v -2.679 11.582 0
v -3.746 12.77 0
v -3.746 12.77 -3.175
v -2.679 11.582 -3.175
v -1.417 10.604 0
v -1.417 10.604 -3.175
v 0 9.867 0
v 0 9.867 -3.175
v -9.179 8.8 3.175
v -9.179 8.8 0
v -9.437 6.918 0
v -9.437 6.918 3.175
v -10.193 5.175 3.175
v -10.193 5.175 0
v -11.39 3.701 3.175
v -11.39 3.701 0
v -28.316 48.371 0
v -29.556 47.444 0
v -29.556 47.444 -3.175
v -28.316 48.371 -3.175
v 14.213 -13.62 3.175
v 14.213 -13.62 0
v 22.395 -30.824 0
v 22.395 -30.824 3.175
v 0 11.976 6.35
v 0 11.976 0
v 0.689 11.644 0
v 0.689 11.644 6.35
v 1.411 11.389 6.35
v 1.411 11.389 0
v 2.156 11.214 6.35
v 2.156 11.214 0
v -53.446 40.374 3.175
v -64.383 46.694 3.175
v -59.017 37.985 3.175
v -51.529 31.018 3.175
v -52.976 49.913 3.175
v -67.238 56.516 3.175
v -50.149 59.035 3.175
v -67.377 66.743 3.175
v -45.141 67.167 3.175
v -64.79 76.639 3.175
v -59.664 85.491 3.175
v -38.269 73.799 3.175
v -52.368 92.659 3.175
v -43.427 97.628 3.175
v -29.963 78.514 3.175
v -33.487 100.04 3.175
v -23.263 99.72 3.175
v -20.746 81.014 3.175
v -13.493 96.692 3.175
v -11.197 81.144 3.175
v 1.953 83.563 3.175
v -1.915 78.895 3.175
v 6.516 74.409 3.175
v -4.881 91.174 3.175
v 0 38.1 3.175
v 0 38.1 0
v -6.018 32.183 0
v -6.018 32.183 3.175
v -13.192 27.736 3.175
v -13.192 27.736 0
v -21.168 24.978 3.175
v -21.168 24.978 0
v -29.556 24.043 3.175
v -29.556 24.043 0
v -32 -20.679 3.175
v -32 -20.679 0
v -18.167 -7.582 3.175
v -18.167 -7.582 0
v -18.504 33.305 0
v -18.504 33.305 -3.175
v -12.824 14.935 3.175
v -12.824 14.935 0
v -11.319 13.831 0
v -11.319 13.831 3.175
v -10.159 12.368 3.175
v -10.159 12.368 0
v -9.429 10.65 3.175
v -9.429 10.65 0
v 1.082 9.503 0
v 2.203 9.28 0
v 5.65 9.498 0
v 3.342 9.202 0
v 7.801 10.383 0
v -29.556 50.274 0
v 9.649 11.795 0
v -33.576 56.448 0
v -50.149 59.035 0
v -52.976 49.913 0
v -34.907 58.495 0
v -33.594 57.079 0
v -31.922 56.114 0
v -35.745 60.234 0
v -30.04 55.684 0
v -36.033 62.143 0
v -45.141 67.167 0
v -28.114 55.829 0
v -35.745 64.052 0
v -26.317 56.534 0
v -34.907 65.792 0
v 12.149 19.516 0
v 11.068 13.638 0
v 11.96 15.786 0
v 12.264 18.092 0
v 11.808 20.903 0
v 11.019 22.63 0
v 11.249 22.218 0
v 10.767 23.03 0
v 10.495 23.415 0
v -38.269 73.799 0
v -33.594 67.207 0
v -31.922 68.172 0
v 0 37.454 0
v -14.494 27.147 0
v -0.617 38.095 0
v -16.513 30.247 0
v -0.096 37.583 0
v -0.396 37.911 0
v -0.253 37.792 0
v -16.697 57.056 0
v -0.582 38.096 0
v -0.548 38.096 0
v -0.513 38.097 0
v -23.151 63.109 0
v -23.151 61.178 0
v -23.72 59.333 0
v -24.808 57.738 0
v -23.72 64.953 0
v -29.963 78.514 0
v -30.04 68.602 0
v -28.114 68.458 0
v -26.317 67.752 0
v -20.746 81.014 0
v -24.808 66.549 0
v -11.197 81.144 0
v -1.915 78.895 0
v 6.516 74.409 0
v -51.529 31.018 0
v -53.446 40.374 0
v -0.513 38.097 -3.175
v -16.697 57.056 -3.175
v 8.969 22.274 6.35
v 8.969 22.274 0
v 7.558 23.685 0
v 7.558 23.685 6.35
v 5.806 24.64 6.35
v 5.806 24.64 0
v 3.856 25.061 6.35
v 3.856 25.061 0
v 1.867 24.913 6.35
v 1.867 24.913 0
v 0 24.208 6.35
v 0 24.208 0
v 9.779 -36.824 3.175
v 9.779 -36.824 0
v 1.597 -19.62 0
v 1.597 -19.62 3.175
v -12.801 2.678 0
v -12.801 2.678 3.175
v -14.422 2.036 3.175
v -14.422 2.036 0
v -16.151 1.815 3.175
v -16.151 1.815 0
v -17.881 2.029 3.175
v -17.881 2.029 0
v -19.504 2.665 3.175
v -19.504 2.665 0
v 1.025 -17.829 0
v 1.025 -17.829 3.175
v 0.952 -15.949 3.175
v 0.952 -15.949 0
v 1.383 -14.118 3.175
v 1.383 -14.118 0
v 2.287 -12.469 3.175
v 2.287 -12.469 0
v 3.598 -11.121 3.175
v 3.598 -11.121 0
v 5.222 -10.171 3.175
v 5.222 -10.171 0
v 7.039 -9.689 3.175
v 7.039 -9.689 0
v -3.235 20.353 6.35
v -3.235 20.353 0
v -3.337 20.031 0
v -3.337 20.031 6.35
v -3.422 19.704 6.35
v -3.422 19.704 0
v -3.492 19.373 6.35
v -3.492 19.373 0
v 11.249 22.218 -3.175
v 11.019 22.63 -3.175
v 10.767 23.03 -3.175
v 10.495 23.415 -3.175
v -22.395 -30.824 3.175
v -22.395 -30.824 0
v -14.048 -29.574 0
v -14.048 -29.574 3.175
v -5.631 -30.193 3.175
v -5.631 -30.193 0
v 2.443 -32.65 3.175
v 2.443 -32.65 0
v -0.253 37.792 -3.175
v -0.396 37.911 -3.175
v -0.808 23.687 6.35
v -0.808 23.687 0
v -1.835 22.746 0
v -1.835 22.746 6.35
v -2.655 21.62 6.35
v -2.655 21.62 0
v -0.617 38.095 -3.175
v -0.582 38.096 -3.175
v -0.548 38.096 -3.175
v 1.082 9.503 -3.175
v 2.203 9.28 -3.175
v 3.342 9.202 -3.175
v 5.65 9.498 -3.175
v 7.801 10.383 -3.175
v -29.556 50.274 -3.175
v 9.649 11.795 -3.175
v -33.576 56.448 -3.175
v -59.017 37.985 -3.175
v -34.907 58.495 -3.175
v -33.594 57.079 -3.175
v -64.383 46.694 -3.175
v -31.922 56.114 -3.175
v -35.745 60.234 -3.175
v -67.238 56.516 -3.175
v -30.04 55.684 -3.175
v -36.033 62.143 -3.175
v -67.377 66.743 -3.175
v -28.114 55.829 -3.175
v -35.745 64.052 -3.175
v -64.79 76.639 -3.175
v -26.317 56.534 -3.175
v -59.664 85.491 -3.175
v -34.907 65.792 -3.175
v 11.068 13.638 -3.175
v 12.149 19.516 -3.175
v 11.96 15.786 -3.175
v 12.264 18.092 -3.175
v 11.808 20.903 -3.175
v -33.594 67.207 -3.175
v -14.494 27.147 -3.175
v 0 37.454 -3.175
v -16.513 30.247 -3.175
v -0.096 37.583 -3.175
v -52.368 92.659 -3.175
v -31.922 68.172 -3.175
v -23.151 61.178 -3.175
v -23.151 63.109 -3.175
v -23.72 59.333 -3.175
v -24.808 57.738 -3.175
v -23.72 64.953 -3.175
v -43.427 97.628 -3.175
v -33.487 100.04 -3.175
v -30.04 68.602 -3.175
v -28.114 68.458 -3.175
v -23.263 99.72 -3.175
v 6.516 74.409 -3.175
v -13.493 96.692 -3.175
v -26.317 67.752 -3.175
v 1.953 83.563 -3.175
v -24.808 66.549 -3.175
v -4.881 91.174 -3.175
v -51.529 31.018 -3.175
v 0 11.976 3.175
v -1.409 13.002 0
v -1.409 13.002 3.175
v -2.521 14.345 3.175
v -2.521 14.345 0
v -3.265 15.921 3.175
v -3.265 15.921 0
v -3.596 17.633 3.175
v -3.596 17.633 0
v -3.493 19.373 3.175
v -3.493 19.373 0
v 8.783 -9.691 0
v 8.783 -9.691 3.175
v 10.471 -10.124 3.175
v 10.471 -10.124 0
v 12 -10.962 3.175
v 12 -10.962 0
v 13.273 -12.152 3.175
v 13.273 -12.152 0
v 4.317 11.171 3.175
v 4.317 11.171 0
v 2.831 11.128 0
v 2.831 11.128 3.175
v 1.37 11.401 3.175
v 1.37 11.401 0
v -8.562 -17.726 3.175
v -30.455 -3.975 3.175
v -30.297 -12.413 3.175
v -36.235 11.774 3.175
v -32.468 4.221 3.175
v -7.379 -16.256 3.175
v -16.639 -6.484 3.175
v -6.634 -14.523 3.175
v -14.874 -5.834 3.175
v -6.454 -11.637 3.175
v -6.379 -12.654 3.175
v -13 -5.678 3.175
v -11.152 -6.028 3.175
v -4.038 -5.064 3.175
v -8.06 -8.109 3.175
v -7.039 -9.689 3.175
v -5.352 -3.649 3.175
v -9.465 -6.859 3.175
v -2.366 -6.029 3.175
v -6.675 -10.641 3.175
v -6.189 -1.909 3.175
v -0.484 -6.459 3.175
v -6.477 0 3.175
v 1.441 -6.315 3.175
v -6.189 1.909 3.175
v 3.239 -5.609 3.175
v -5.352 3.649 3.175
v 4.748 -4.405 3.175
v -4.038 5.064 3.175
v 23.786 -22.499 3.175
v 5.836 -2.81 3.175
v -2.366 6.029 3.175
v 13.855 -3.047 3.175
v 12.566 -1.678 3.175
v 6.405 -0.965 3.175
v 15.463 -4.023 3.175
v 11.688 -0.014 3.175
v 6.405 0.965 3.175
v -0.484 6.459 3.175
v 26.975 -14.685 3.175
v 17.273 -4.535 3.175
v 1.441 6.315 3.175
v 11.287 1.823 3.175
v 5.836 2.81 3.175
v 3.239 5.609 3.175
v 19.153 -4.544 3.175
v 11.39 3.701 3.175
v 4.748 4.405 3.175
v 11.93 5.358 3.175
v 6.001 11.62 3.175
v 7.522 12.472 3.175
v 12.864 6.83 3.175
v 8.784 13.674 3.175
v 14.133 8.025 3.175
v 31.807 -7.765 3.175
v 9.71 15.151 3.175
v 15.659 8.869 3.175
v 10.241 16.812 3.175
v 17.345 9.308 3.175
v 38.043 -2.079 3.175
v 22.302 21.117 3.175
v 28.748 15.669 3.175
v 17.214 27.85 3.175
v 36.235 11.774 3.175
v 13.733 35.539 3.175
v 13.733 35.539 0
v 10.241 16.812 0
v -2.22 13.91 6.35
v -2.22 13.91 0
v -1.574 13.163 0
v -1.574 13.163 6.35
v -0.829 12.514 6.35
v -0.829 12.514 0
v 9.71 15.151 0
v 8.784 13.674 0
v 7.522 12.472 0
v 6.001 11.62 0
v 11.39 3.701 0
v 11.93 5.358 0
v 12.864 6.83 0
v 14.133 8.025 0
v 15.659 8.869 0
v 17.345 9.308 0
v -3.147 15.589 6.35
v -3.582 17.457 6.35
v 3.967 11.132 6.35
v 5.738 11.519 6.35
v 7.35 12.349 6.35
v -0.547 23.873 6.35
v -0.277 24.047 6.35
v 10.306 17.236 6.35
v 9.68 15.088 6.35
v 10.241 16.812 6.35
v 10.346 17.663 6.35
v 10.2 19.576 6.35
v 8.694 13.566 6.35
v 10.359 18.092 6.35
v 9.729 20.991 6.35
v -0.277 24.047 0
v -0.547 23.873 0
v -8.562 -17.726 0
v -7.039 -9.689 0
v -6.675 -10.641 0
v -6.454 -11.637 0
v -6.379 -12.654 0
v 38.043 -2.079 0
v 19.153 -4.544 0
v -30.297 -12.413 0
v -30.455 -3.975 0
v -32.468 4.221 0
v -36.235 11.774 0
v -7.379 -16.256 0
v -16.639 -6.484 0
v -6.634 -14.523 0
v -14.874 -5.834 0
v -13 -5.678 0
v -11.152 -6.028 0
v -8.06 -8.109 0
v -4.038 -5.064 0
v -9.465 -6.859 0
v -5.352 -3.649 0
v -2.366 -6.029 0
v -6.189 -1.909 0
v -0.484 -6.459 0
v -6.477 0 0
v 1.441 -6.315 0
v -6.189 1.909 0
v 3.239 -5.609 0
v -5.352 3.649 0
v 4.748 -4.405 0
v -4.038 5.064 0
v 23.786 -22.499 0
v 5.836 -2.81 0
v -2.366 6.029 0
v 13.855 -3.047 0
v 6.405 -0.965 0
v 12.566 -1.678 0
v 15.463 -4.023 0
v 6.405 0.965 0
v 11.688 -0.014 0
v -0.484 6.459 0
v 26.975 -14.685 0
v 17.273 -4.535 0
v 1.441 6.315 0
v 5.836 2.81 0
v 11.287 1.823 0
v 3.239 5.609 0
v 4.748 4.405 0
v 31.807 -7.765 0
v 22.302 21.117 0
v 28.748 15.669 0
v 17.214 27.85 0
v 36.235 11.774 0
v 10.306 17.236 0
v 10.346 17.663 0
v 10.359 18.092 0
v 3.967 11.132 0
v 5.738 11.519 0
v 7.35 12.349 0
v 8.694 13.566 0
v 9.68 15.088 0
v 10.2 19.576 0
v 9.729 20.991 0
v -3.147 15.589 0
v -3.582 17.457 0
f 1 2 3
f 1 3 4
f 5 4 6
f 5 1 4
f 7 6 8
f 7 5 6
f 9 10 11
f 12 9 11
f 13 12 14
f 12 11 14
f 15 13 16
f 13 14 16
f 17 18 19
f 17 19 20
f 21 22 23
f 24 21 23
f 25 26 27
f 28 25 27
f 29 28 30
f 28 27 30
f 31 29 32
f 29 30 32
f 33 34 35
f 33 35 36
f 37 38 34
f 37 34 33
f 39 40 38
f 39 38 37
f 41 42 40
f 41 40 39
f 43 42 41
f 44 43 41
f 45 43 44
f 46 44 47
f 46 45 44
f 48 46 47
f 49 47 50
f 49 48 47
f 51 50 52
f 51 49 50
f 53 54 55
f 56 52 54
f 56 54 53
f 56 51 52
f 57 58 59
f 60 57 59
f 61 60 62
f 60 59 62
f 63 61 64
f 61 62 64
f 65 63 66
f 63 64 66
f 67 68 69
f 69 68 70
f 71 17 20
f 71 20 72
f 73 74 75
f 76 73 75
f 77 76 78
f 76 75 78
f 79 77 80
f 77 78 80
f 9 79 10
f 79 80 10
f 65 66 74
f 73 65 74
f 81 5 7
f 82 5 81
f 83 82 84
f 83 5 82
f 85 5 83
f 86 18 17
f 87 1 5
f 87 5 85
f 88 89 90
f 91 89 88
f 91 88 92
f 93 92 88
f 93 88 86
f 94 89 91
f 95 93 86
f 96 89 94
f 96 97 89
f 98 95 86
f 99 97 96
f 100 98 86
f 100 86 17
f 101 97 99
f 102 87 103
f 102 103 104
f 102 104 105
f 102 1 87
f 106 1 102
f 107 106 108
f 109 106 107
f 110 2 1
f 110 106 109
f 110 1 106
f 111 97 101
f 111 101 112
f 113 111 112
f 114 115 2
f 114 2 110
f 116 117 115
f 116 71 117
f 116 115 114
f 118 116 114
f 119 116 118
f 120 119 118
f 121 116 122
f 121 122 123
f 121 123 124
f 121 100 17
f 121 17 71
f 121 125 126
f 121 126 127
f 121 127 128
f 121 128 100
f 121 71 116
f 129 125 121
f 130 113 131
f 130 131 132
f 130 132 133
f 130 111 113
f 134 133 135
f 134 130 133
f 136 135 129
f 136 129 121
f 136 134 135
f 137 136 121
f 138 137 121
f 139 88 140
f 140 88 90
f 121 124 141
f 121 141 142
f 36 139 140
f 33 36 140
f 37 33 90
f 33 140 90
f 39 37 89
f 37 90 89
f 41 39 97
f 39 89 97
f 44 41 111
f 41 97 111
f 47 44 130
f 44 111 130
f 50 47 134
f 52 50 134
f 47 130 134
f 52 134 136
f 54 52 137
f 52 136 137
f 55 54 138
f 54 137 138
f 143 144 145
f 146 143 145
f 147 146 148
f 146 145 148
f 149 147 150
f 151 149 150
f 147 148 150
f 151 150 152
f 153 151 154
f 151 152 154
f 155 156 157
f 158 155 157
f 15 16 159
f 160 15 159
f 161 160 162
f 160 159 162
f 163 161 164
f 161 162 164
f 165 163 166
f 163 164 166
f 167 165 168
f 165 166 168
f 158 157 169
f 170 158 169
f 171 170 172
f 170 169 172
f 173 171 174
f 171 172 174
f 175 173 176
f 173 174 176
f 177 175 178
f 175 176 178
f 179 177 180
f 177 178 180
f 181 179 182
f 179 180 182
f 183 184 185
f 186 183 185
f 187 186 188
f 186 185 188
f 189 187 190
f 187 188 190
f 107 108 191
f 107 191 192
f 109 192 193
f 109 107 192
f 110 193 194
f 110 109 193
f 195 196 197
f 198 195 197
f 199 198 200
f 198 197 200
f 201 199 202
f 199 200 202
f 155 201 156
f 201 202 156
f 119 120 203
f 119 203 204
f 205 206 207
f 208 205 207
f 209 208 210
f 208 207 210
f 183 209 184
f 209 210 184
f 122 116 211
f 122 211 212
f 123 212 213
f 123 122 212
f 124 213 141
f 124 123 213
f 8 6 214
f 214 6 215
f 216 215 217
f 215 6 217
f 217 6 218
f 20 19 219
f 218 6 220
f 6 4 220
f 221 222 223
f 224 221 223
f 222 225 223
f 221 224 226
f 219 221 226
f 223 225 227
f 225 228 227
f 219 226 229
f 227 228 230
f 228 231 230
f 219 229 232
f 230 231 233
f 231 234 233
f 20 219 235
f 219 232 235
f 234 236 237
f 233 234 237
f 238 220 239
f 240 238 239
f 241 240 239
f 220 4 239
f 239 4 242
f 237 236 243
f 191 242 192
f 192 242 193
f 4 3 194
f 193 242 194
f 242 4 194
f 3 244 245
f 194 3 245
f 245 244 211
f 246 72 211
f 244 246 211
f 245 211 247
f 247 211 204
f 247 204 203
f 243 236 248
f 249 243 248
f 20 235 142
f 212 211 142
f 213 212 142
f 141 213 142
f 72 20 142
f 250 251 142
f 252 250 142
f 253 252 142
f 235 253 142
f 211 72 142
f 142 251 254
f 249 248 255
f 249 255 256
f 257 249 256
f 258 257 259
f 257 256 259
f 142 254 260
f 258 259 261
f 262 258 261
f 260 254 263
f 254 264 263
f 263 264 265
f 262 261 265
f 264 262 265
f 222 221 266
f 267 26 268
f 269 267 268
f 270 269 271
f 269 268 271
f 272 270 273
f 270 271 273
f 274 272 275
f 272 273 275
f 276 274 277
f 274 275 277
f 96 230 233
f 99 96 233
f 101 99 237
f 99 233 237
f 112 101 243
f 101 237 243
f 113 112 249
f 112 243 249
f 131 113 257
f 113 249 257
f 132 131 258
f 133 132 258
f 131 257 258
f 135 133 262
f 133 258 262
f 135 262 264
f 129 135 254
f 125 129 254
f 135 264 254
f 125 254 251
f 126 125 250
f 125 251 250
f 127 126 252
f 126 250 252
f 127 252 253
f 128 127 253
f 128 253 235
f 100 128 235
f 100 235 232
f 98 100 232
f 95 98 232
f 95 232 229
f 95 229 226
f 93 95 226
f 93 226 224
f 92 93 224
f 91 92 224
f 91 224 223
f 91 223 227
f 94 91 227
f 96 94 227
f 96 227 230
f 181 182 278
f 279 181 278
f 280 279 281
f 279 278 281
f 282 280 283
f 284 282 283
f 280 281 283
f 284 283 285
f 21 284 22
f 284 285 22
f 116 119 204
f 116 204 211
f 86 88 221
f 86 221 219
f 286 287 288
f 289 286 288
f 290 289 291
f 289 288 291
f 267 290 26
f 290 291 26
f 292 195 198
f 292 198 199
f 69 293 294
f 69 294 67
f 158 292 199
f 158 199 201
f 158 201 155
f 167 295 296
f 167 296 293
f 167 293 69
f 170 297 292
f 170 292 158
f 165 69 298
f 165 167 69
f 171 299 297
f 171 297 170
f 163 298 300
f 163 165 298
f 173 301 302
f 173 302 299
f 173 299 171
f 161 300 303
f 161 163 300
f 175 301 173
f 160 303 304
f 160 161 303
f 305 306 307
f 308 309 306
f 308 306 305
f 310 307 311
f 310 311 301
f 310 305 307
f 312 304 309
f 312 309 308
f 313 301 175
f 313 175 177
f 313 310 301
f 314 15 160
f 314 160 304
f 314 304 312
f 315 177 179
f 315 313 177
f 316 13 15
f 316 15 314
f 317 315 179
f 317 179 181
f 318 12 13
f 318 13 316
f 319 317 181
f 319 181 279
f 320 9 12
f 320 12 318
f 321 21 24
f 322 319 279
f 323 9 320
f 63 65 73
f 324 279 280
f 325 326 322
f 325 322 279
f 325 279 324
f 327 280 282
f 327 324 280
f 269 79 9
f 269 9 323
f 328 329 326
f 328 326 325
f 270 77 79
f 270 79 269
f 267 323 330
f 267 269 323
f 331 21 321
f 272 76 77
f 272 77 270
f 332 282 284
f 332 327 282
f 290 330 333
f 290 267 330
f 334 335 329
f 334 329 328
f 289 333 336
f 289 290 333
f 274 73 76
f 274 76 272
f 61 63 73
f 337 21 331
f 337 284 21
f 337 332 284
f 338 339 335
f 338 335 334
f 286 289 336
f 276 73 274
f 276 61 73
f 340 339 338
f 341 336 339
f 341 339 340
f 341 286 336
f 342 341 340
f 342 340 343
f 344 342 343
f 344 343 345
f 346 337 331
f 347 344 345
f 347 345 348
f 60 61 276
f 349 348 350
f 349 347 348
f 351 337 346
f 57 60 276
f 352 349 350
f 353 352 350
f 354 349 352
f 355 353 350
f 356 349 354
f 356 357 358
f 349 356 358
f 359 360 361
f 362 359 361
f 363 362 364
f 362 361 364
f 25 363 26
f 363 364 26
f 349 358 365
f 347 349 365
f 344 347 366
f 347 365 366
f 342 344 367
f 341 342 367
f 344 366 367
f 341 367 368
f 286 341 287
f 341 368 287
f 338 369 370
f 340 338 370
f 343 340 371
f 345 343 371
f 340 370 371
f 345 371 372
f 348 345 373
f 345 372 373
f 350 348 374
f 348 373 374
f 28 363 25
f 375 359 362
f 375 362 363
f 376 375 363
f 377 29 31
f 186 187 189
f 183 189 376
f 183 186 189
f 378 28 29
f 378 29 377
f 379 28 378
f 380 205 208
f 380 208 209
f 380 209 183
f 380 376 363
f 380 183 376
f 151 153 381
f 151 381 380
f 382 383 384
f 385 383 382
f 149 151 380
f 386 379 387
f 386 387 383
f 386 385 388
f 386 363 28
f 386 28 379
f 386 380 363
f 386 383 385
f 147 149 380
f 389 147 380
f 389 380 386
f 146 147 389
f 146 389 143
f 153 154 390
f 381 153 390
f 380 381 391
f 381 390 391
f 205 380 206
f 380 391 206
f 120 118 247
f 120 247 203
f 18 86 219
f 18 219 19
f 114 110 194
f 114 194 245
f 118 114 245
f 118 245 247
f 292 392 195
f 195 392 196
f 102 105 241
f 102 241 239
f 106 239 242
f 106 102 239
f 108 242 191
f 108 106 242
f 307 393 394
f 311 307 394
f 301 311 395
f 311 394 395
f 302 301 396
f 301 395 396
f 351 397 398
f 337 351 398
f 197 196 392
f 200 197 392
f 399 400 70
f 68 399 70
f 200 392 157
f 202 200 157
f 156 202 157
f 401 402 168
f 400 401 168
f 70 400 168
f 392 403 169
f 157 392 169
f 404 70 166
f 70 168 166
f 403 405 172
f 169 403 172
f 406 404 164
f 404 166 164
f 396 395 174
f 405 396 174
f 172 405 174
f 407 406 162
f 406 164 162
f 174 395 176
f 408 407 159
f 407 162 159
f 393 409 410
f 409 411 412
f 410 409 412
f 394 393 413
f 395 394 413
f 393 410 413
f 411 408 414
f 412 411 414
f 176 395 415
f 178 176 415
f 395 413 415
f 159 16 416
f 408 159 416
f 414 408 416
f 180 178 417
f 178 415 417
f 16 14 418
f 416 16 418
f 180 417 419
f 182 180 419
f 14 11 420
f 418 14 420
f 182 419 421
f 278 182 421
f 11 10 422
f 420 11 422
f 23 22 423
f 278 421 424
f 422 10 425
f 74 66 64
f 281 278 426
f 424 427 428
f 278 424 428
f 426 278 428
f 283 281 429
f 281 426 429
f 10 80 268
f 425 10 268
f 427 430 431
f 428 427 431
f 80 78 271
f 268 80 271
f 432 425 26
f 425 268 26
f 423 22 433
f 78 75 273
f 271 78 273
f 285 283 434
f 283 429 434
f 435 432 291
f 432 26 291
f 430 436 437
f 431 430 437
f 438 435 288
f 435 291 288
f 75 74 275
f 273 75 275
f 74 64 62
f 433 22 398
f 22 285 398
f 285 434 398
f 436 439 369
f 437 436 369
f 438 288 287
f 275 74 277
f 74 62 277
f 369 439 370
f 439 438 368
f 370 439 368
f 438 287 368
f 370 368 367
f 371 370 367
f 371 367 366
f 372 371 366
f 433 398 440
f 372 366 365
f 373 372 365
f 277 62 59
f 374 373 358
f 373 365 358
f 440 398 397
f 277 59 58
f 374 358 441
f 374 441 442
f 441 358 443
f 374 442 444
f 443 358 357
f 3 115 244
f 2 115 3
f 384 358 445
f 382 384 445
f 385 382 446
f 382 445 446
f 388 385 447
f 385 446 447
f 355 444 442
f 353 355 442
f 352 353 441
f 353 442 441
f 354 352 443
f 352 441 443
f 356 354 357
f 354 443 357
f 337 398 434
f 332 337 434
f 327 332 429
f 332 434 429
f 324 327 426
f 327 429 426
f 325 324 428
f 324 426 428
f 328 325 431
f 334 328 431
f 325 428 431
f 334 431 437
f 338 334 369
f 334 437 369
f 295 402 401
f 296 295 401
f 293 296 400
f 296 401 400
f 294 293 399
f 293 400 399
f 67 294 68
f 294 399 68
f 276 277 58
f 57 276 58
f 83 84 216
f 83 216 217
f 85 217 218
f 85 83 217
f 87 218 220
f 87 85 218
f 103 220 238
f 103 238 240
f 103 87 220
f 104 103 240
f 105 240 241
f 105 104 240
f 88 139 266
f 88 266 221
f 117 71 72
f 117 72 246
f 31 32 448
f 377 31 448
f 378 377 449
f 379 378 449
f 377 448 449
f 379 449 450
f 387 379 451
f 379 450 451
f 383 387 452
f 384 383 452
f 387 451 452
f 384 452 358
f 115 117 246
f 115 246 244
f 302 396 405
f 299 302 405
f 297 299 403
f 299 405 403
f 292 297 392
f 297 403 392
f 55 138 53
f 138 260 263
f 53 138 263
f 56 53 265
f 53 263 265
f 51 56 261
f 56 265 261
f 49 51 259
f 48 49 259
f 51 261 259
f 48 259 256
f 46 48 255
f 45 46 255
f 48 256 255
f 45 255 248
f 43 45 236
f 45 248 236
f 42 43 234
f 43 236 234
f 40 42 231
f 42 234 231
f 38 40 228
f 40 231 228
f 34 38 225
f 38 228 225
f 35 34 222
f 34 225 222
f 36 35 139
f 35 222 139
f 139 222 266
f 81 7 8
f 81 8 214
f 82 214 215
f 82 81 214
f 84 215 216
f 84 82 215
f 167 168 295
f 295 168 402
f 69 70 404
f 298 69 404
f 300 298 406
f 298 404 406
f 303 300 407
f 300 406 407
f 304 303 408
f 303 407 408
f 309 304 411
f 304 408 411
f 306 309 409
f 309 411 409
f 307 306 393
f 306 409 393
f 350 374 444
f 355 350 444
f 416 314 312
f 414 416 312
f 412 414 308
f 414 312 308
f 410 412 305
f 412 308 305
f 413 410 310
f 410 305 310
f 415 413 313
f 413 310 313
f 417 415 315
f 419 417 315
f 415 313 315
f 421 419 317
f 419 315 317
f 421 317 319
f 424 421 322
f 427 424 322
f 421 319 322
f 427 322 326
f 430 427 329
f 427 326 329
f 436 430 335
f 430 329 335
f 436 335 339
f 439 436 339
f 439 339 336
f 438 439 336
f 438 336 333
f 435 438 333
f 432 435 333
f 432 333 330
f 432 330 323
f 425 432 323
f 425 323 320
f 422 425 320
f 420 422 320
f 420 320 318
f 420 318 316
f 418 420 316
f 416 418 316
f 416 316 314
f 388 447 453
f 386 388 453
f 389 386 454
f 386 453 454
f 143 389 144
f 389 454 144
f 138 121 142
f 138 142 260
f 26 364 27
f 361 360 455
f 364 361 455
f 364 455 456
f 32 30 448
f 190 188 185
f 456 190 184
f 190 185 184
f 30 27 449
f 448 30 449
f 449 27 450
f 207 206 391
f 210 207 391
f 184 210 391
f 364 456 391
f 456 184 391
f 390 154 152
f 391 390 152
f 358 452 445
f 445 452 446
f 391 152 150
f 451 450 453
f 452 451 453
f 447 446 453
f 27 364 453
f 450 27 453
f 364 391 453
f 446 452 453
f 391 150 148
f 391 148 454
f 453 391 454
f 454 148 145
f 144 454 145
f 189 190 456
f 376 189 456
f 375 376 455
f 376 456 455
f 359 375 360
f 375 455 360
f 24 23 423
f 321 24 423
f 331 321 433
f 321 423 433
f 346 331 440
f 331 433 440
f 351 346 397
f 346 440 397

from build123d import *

# Parameters (mm, degrees)
F1_DEPTH = 3.175
F3_DEPTH = 3.175
F4_DEPTH = 3.175
F5_DEPTH = 6.35
F6_D     = 12.954
F7_D     = 12.954


with BuildPart() as f1:
    # F0 (on Top) → F1 (new body)
    with BuildSketch(Plane.XY):
        with BuildLine():
            Line((-3.4925, 19.3728821291), (0, 38.1))
            ThreePointArc((0, 38.1), (-13.191577027, 27.7363784004), (-29.5556407262, 24.0431716141))
            Line((-29.5556407262, 24.0431716141), (-12.8243350965, 14.9346090532))
            ThreePointArc((-12.8243350965, 14.9346090532), (-10.1591945825, 12.3678271309), (-9.1791413688, 8.799796989))
            ThreePointArc((-9.1791413688, 8.799796989), (-9.7556810347, 6.0209732906), (-11.3901252333, 3.7008760308))
            Line((-11.3901252333, 3.7008760308), (0, 0))
            Line((0, 0), (0, 11.9762864121))
            ThreePointArc((0, 11.9762864121), (-2.9421779805, 15.1098949687), (-3.4925, 19.3728821291))
        make_face()
        with BuildLine():
            Line((-7.0394845303, -9.6890192369), (0, 0))
            Line((0, 0), (-11.3901252333, 3.7008760308))
            ThreePointArc((-11.3901252333, 3.7008760308), (-15.279547067, 1.8710367881), (-19.5039476412, 2.6649849248))
            Line((-19.5039476412, 2.6649849248), (-36.2352532708, 11.7735474857))
            ThreePointArc((-36.2352532708, 11.7735474857), (-30.4552849001, -3.9749230036), (-31.9996103, -20.6793360785))
            Line((-31.9996103, -20.6793360785), (-18.1665947447, -7.5816194589))
            ThreePointArc((-18.1665947447, -7.5816194589), (-12.0642931739, -5.7907279512), (-7.0394845303, -9.6890192369))
        make_face()
        with BuildLine():
            ThreePointArc((-22.3946181123, -30.8235474857), (-5.6308241783, -30.1930159193), (9.778793934, -36.8237041754))
            Line((9.778793934, -36.8237041754), (1.5967620844, -19.6203075685))
            ThreePointArc((1.5967620844, -19.6203075685), (1.7792379362, -13.2632579843), (7.0394845303, -9.6890192369))
            Line((7.0394845303, -9.6890192369), (0, 0))
            Line((0, 0), (-7.0394845303, -9.6890192369))
            ThreePointArc((-7.0394845303, -9.6890192369), (-6.5461937442, -11.1350422846), (-6.3790986509, -12.6537251625))
            ThreePointArc((-6.3790986509, -12.6537251625), (-6.9478824678, -15.4145936657), (-8.561602557, -17.7258308661))
            Line((-8.561602557, -17.7258308661), (-22.3946181123, -30.8235474857))
        make_face()
        with BuildLine():
            ThreePointArc((22.3946181123, -30.8235474857), (26.9752441732, -14.6853870574), (38.0432373202, -2.0789646936))
            Line((38.0432373202, -2.0789646936), (19.1534479848, -4.5443974882))
            ThreePointArc((19.1534479848, -4.5443974882), (13.1639226926, -2.4064162846), (11.3901252333, 3.7008760308))
            Line((11.3901252333, 3.7008760308), (0, 0))
            Line((0, 0), (7.0394845303, -9.6890192369))
            ThreePointArc((7.0394845303, -9.6890192369), (11.261645413, -10.4947929864), (14.2125862627, -13.6201508788))
            Line((14.2125862627, -13.6201508788), (22.3946181123, -30.8235474857))
        make_face()
        with BuildLine():
            Line((17.3454639355, 9.3081146911), (36.2352532708, 11.7735474857))
            ThreePointArc((36.2352532708, 11.7735474857), (22.3024419322, 21.1169475799), (13.733219772, 35.5388333333))
            Line((13.733219772, 35.5388333333), (10.240719772, 16.8117154624))
            ThreePointArc((10.240719772, 16.8117154624), (8.1907895334, 13.0336604242), (4.3168759409, 11.1712138255))
            Line((4.3168759409, 11.1712138255), (0, 0))
            Line((0, 0), (11.3901252333, 3.7008760308))
            ThreePointArc((11.3901252333, 3.7008760308), (13.4611810741, 7.467391869), (17.3454639355, 9.3081146911))
        make_face()
        with BuildLine():
            Line((0, 0), (4.3168759409, 11.1712138255))
            ThreePointArc((4.3168759409, 11.1712138255), (2.0935265527, 11.2256889098), (0, 11.9762864121))
            Line((0, 11.9762864121), (0, 0))
        make_face()
    extrude(amount=F1_DEPTH)

    # F6 (through all)
    with Locations(Plane(origin=(0, 0, 0), x_dir=(1, 0, 0), z_dir=(0, 0, -1))):
        with Locations((0, 0)):
            Hole(F6_D / 2)


with BuildPart() as f3:
    # F2 (on Top) → F3 (new body)
    with BuildSketch(Plane.XY):
        with BuildLine():
            Line((0, 22.6059219694), (3.374109886, 18.0922987958))
            Line((3.374109886, 18.0922987958), (8.9687114132, 22.2744822868))
            ThreePointArc((8.9687114132, 22.2744822868), (4.8463766175, 24.9203772716), (0, 24.2083111795))
            Line((0, 24.2083111795), (0, 22.6059219694))
        make_face()
        with BuildLine():
            Line((3.374109886, 18.0922987958), (10.240719772, 16.8117154624))
            ThreePointArc((10.240719772, 16.8117154624), (10.3294493836, 17.4492766553), (10.359109886, 18.0922987958))
            ThreePointArc((10.359109886, 18.0922987958), (10.0024021497, 20.2959245958), (8.9687114132, 22.2744822868))
            Line((8.9687114132, 22.2744822868), (3.374109886, 18.0922987958))
        make_face()
        with BuildLine():
            ThreePointArc((2.1556683682, 11.2143903006), (7.3500328883, 12.3492803142), (10.240719772, 16.8117154624))
            Line((10.240719772, 16.8117154624), (3.374109886, 18.0922987958))
            Line((3.374109886, 18.0922987958), (0, 15.5700196677))
            Line((0, 15.5700196677), (0, 14.8690522954))
            Line((0, 14.8690522954), (2.1556683682, 11.2143903006))
        make_face()
        Polygon((0, 15.5700196677), (0, 18.7215509241), (-2.5532194688, 19.197711701), (-0.286939248, 15.3555213553), align=None)
        Polygon((0, 15.5700196677), (3.374109886, 18.0922987958), (0, 18.7215509241), align=None)
        Polygon((0, 18.7215509241), (3.374109886, 18.0922987958), (0, 22.6059219694), align=None)
        with BuildLine():
            ThreePointArc((-3.7462920577, 12.7695198073), (-2.0700740867, 11.0642862125), (0, 9.8674898328))
            Line((0, 9.8674898328), (0, 11.9762864121))
            ThreePointArc((0, 11.9762864121), (-1.2133043802, 12.8248653268), (-2.2204916412, 13.9101153048))
            Line((-2.2204916412, 13.9101153048), (-3.7462920577, 12.7695198073))
        make_face()
        with BuildLine():
            Line((-3.2916828829, 20.4496826507), (-2.4843020924, 24.7789354011))
            ThreePointArc((-2.4843020924, 24.7789354011), (-3.5587978247, 23.6570890591), (-4.4216116838, 22.3653334559))
            Line((-4.4216116838, 22.3653334559), (-3.2916828829, 20.4496826507))
        make_face()
        with BuildLine():
            Line((0, 11.9762864121), (0, 9.8674898328))
            ThreePointArc((0, 9.8674898328), (1.6390535727, 9.3732575876), (3.3424485628, 9.2023551761))
            Line((3.3424485628, 9.2023551761), (2.1556683682, 11.2143903006))
            ThreePointArc((2.1556683682, 11.2143903006), (1.0464493608, 11.5065398054), (0, 11.9762864121))
        make_face()
        with BuildLine():
            Line((10.240719772, 16.8117154624), (11.2489176796, 22.2177687344))
            ThreePointArc((11.2489176796, 22.2177687344), (10.8955768976, 22.8314584253), (10.4945118297, 23.4150777843))
            Line((10.4945118297, 23.4150777843), (8.9687114132, 22.2744822868))
            ThreePointArc((8.9687114132, 22.2744822868), (10.0024021497, 20.2959245958), (10.359109886, 18.0922987958))
            ThreePointArc((10.359109886, 18.0922987958), (10.3294493836, 17.4492766553), (10.240719772, 16.8117154624))
        make_face()
        with BuildLine():
            Line((8.9687114132, 22.2744822868), (10.4945118297, 23.4150777843))
            ThreePointArc((10.4945118297, 23.4150777843), (5.7435234291, 26.6607280253), (0, 26.3171077587))
            Line((0, 26.3171077587), (0, 24.2083111795))
            ThreePointArc((0, 24.2083111795), (4.8463766175, 24.9203772716), (8.9687114132, 22.2744822868))
        make_face()
        with BuildLine():
            Line((0, 24.2083111795), (0, 26.3171077587))
            ThreePointArc((0, 26.3171077587), (-1.0092561425, 25.8265215919), (-1.9486691025, 25.2127007395))
            Line((-1.9486691025, 25.2127007395), (-0.808073605, 23.6869003229))
            ThreePointArc((-0.808073605, 23.6869003229), (-0.4130209171, 23.961529178), (0, 24.2083111795))
        make_face()
        with BuildLine():
            Line((-0.808073605, 23.6869003229), (-1.9486691025, 25.2127007395))
            ThreePointArc((-1.9486691025, 25.2127007395), (-2.2206909105, 25.0010109803), (-2.4843020924, 24.7789354011))
            Line((-2.4843020924, 24.7789354011), (-3.2916828829, 20.4496826507))
            Line((-3.2916828829, 20.4496826507), (-3.2348314891, 20.3532983314))
            ThreePointArc((-3.2348314891, 20.3532983314), (-2.2730415666, 22.2032482569), (-0.808073605, 23.6869003229))
        make_face()
        with BuildLine():
            ThreePointArc((-8.9728483214, 30.081377266), (-11.6730301026, 28.5006057595), (-14.49381421, 27.1467234801))
            Line((-14.49381421, 27.1467234801), (-3.7462920577, 12.7695198073))
            ThreePointArc((-3.7462920577, 12.7695198073), (-5.4939561412, 17.4681954886), (-4.4216116838, 22.3653334559))
            Line((-4.4216116838, 22.3653334559), (-8.9728483214, 30.081377266))
        make_face()
        with BuildLine():
            Line((-2.3126117983, 25.6995551221), (-0.0964468265, 37.5828429241))
            Line((-0.0964468265, 37.5828429241), (-0.2530103227, 37.7922814571))
            ThreePointArc((-0.2530103227, 37.7922814571), (-3.3166716228, 34.5184272643), (-6.7437307754, 31.6271632841))
            Line((-6.7437307754, 31.6271632841), (-2.3126117983, 25.6995551221))
        make_face()
        with BuildLine():
            Line((10.4945118297, 23.4150777843), (0, 37.4538238211))
            Line((0, 37.4538238211), (0, 26.3171077587))
            ThreePointArc((0, 26.3171077587), (5.7435234291, 26.6607280253), (10.4945118297, 23.4150777843))
        make_face()
        with BuildLine():
            Line((0, 26.3171077587), (0, 37.4538238211))
            Line((0, 37.4538238211), (-0.0964468265, 37.5828429241))
            Line((-0.0964468265, 37.5828429241), (-2.3126117983, 25.6995551221))
            Line((-2.3126117983, 25.6995551221), (-1.9486691025, 25.2127007395))
            ThreePointArc((-1.9486691025, 25.2127007395), (-1.0092561425, 25.8265215919), (0, 26.3171077587))
        make_face()
        with BuildLine():
            Line((0, 22.6059219694), (0, 24.2083111795))
            ThreePointArc((0, 24.2083111795), (-0.4130209171, 23.961529178), (-0.808073605, 23.6869003229))
            Line((-0.808073605, 23.6869003229), (0, 22.6059219694))
        make_face()
        with BuildLine():
            Line((-1.9486691025, 25.2127007395), (-2.3126117983, 25.6995551221))
            Line((-2.3126117983, 25.6995551221), (-2.4843020924, 24.7789354011))
            ThreePointArc((-2.4843020924, 24.7789354011), (-2.2206909105, 25.0010109803), (-1.9486691025, 25.2127007395))
        make_face()
        with BuildLine():
            ThreePointArc((-6.7437307754, 31.6271632841), (-3.3166716228, 34.5184272643), (-0.2530103227, 37.7922814571))
            Line((-0.2530103227, 37.7922814571), (-0.3964227158, 37.9114591345))
            Line((-0.3964227158, 37.9114591345), (-8.5445523178, 34.0361630263))
            Line((-8.5445523178, 34.0361630263), (-6.7437307754, 31.6271632841))
        make_face()
        with BuildLine():
            ThreePointArc((-8.9728483214, 30.081377266), (-7.8445280938, 30.8344254197), (-6.7437307754, 31.6271632841))
            Line((-6.7437307754, 31.6271632841), (-8.5445523178, 34.0361630263))
            Line((-8.5445523178, 34.0361630263), (-10.7006800626, 33.0106965859))
            Line((-10.7006800626, 33.0106965859), (-8.9728483214, 30.081377266))
        make_face()
        with BuildLine():
            ThreePointArc((-10.483112718, 36.6294191565), (-14.5886680137, 35.1963175004), (-18.5041843573, 33.304731815))
            Line((-18.5041843573, 33.304731815), (-16.5125517946, 30.2465378152))
            Line((-16.5125517946, 30.2465378152), (-10.7006800626, 33.0106965859))
            Line((-10.7006800626, 33.0106965859), (-8.5445523178, 34.0361630263))
            Line((-8.5445523178, 34.0361630263), (-10.483112718, 36.6294191565))
        make_face()
        with BuildLine():
            Line((-0.3964227158, 37.9114591345), (-0.6172854684, 38.0949991292))
            ThreePointArc((-0.6172854684, 38.0949991292), (-5.5983650416, 37.6864472836), (-10.483112718, 36.6294191565))
            Line((-10.483112718, 36.6294191565), (-8.5445523178, 34.0361630263))
            Line((-8.5445523178, 34.0361630263), (-0.3964227158, 37.9114591345))
        make_face()
        with BuildLine():
            ThreePointArc((-0.6172854684, 38.0949991292), (-0.5650149545, 38.0958102434), (-0.5127433768, 38.0965496368))
            Line((-0.5127433768, 38.0965496368), (-16.6970522411, 57.0559008639))
            Line((-16.6970522411, 57.0559008639), (-22.5063728772, 52.7132064397))
            Line((-22.5063728772, 52.7132064397), (-10.483112718, 36.6294191565))
            ThreePointArc((-10.483112718, 36.6294191565), (-5.5983650416, 37.6864472836), (-0.6172854684, 38.0949991292))
        make_face()
        with BuildLine():
            Line((-28.3156935133, 48.3705120154), (-18.5041843573, 33.304731815))
            ThreePointArc((-18.5041843573, 33.304731815), (-14.5886680137, 35.1963175004), (-10.483112718, 36.6294191565))
            Line((-10.483112718, 36.6294191565), (-22.5063728772, 52.7132064397))
            Line((-22.5063728772, 52.7132064397), (-28.3156935133, 48.3705120154))
        make_face()
        with BuildLine():
            Line((-22.5063728772, 52.7132064397), (-16.6970522411, 57.0559008639))
            Line((-16.6970522411, 57.0559008639), (-22.9554744347, 64.3874233584))
            Line((-22.9554744347, 64.3874233584), (-23.4234489343, 64.2282981878))
            ThreePointArc((-23.4234489343, 64.2282981878), (-23.1654241713, 63.1998936126), (-23.0786407262, 62.1431716141))
            ThreePointArc((-23.0786407262, 62.1431716141), (-23.7647213291, 59.2420026194), (-25.6776160345, 56.955450198))
            Line((-25.6776160345, 56.955450198), (-22.5063728772, 52.7132064397))
        make_face()
        with BuildLine():
            Line((-29.5556407262, 50.2744772333), (-28.3156935133, 48.3705120154))
            Line((-28.3156935133, 48.3705120154), (-22.5063728772, 52.7132064397))
            Line((-22.5063728772, 52.7132064397), (-25.6776160345, 56.955450198))
            ThreePointArc((-25.6776160345, 56.955450198), (-27.5122786207, 55.9969369696), (-29.5556407262, 55.6661716141))
            Line((-29.5556407262, 55.6661716141), (-29.5556407262, 50.2744772333))
        make_face()
        with BuildLine():
            Line((-33.2910814494, 56.8518568811), (-33.576149344, 56.4480534045))
            Line((-33.576149344, 56.4480534045), (-29.5556407262, 50.2744772333))
            Line((-29.5556407262, 50.2744772333), (-29.5556407262, 55.6661716141))
            ThreePointArc((-29.5556407262, 55.6661716141), (-31.5151921384, 55.9697052246), (-33.2910814494, 56.8518568811))
        make_face()
        with BuildLine():
            Line((-29.5556407262, 62.1431716141), (-33.2910814494, 56.8518568811))
            ThreePointArc((-33.2910814494, 56.8518568811), (-31.5151921384, 55.9697052246), (-29.5556407262, 55.6661716141))
            Line((-29.5556407262, 55.6661716141), (-29.5556407262, 62.1431716141))
        make_face()
        with BuildLine():
            Line((-29.5556407262, 62.1431716141), (-29.5556407262, 55.6661716141))
            ThreePointArc((-29.5556407262, 55.6661716141), (-27.5122786207, 55.9969369696), (-25.6776160345, 56.955450198))
            Line((-25.6776160345, 56.955450198), (-29.5556407262, 62.1431716141))
        make_face()
        with BuildLine():
            ThreePointArc((-23.0786407262, 62.1431716141), (-23.1654241713, 63.1998936126), (-23.4234489343, 64.2282981878))
            Line((-23.4234489343, 64.2282981878), (-29.5556407262, 62.1431716141))
            Line((-29.5556407262, 62.1431716141), (-25.6776160345, 56.955450198))
            ThreePointArc((-25.6776160345, 56.955450198), (-23.7647213291, 59.2420026194), (-23.0786407262, 62.1431716141))
        make_face()
        with BuildLine():
            ThreePointArc((-24.6293998875, 66.3483684227), (-33.4336654178, 67.3308930302), (-34.9831510827, 58.6085343866))
            Line((-34.9831510827, 58.6085343866), (-24.6293998875, 66.3483684227))
        make_face()
        with BuildLine():
            Line((-24.6293998875, 66.3483684227), (-34.9831510827, 58.6085343866))
            ThreePointArc((-34.9831510827, 58.6085343866), (-34.2205519886, 57.6498285476), (-33.2910814494, 56.8518568811))
            Line((-33.2910814494, 56.8518568811), (-29.5556407262, 62.1431716141))
            Line((-29.5556407262, 62.1431716141), (-23.4234489343, 64.2282981878))
            ThreePointArc((-23.4234489343, 64.2282981878), (-23.9257288697, 65.3456115415), (-24.6293998875, 66.3483684227))
        make_face()
        with BuildLine():
            Line((-34.9831510827, 58.6085343866), (-33.576149344, 56.4480534045))
            Line((-33.576149344, 56.4480534045), (-33.2910814494, 56.8518568811))
            ThreePointArc((-33.2910814494, 56.8518568811), (-34.2205519886, 57.6498285476), (-34.9831510827, 58.6085343866))
        make_face()
        with BuildLine():
            Line((-23.4234489343, 64.2282981878), (-22.9554744347, 64.3874233584))
            Line((-22.9554744347, 64.3874233584), (-24.6293998875, 66.3483684227))
            ThreePointArc((-24.6293998875, 66.3483684227), (-23.9257288697, 65.3456115415), (-23.4234489343, 64.2282981878))
        make_face()
        with BuildLine():
            ThreePointArc((6.5160756963, 74.4086220475), (-52.367550677, 92.6591799441), (-51.5288214508, 31.0177908318))
            ThreePointArc((-51.5288214508, 31.0177908318), (-38.2690149791, 73.7992495952), (6.5160756963, 74.4086220475))
        make_face()
        with BuildLine():
            ThreePointArc((6.5160756963, 74.4086220475), (-38.2690149791, 73.7992495952), (-51.5288214508, 31.0177908318))
            Line((-51.5288214508, 31.0177908318), (-33.576149344, 56.4480534045))
            Line((-33.576149344, 56.4480534045), (-34.9831510827, 58.6085343866))
            ThreePointArc((-34.9831510827, 58.6085343866), (-33.4336654178, 67.3308930302), (-24.6293998875, 66.3483684227))
            Line((-24.6293998875, 66.3483684227), (-22.9554744347, 64.3874233584))
            Line((-22.9554744347, 64.3874233584), (6.5160756963, 74.4086220475))
        make_face()
        Polygon((-29.5556407262, 50.2744772333), (-29.5556407262, 47.4436029696), (-28.3156935133, 48.3705120154), align=None)
        Polygon((-22.9554744347, 64.3874233584), (-16.6970522411, 57.0559008639), (6.5160756963, 74.4086220475), align=None)
        with BuildLine():
            ThreePointArc((-4.4216116838, 22.3653334559), (-5.4939561412, 17.4681954886), (-3.7462920577, 12.7695198073))
            Line((-3.7462920577, 12.7695198073), (-2.2204916412, 13.9101153048))
            ThreePointArc((-2.2204916412, 13.9101153048), (-3.4288970091, 16.508214775), (-3.4925, 19.3728821291))
            Line((-3.4925, 19.3728821291), (-3.2916828829, 20.4496826507))
            Line((-3.2916828829, 20.4496826507), (-4.4216116838, 22.3653334559))
        make_face()
        with BuildLine():
            ThreePointArc((-3.4925, 19.3728821291), (-3.4288970091, 16.508214775), (-2.2204916412, 13.9101153048))
            Line((-2.2204916412, 13.9101153048), (-0.286939248, 15.3555213553))
            Line((-0.286939248, 15.3555213553), (-2.5532194688, 19.197711701))
            Line((-2.5532194688, 19.197711701), (-3.4925, 19.3728821291))
        make_face()
        with BuildLine():
            ThreePointArc((0, 11.9762864121), (1.0464493608, 11.5065398054), (2.1556683682, 11.2143903006))
            Line((2.1556683682, 11.2143903006), (0, 14.8690522954))
            Line((0, 14.8690522954), (0, 11.9762864121))
        make_face()
        with BuildLine():
            ThreePointArc((-2.2204916412, 13.9101153048), (-1.2133043802, 12.8248653268), (0, 11.9762864121))
            Line((0, 11.9762864121), (0, 14.8690522954))
            Line((0, 14.8690522954), (-0.286939248, 15.3555213553))
            Line((-0.286939248, 15.3555213553), (-2.2204916412, 13.9101153048))
        make_face()
        with BuildLine():
            Line((-2.5532194688, 19.197711701), (0, 18.7215509241))
            Line((0, 18.7215509241), (0, 22.6059219694))
            Line((0, 22.6059219694), (-0.808073605, 23.6869003229))
            ThreePointArc((-0.808073605, 23.6869003229), (-2.2730415666, 22.2032482569), (-3.2348314891, 20.3532983314))
            Line((-3.2348314891, 20.3532983314), (-2.5532194688, 19.197711701))
        make_face()
        with BuildLine():
            Line((-3.4925, 19.3728821291), (-2.5532194688, 19.197711701))
            Line((-2.5532194688, 19.197711701), (-3.2348314891, 20.3532983314))
            ThreePointArc((-3.2348314891, 20.3532983314), (-3.3814747986, 19.8677707245), (-3.4925, 19.3728821291))
        make_face()
        Polygon((0, 14.8690522954), (0, 15.5700196677), (-0.286939248, 15.3555213553), align=None)
        with BuildLine():
            ThreePointArc((12.264109886, 18.0922987958), (12.0065817592, 20.2165702845), (11.2489176796, 22.2177687344))
            Line((11.2489176796, 22.2177687344), (10.240719772, 16.8117154624))
            ThreePointArc((10.240719772, 16.8117154624), (7.3500328883, 12.3492803142), (2.1556683682, 11.2143903006))
            Line((2.1556683682, 11.2143903006), (3.3424485628, 9.2023551761))
            ThreePointArc((3.3424485628, 9.2023551761), (9.6490852181, 11.7949354919), (12.264109886, 18.0922987958))
        make_face()
        with BuildLine():
            Line((-2.4843020924, 24.7789354011), (-2.3126117983, 25.6995551221))
            Line((-2.3126117983, 25.6995551221), (-6.7437307754, 31.6271632841))
            ThreePointArc((-6.7437307754, 31.6271632841), (-7.8445280938, 30.8344254197), (-8.9728483214, 30.081377266))
            Line((-8.9728483214, 30.081377266), (-4.4216116838, 22.3653334559))
            ThreePointArc((-4.4216116838, 22.3653334559), (-3.5587978247, 23.6570890591), (-2.4843020924, 24.7789354011))
        make_face()
        with BuildLine():
            Line((-10.7006800626, 33.0106965859), (-16.5125517946, 30.2465378152))
            Line((-16.5125517946, 30.2465378152), (-14.49381421, 27.1467234801))
            ThreePointArc((-14.49381421, 27.1467234801), (-11.6730301026, 28.5006057595), (-8.9728483214, 30.081377266))
            Line((-8.9728483214, 30.081377266), (-10.7006800626, 33.0106965859))
        make_face()
        with BuildLine():
            Line((-3.2348314891, 20.3532983314), (-3.2916828829, 20.4496826507))
            Line((-3.2916828829, 20.4496826507), (-3.4925, 19.3728821291))
            ThreePointArc((-3.4925, 19.3728821291), (-3.3814747986, 19.8677707245), (-3.2348314891, 20.3532983314))
        make_face()
    extrude(amount=-F3_DEPTH)

    # F2 (on Top) → F4 (join)
    with BuildSketch(Plane.XY):
        with BuildLine():
            ThreePointArc((6.5160756963, 74.4086220475), (-52.367550677, 92.6591799441), (-51.5288214508, 31.0177908318))
            ThreePointArc((-51.5288214508, 31.0177908318), (-38.2690149791, 73.7992495952), (6.5160756963, 74.4086220475))
        make_face()
    extrude(amount=F4_DEPTH)

    # F7 (through all)
    with Locations(Plane.XY):
        with Locations((-29.5556407262, 62.1431716141)):
            Hole(F7_D / 2)


with BuildPart() as f5:
    # F2 (on Top) → F5 (new body)
    with BuildSketch(Plane.XY):
        with BuildLine():
            Line((0, 22.6059219694), (3.374109886, 18.0922987958))
            Line((3.374109886, 18.0922987958), (8.9687114132, 22.2744822868))
            ThreePointArc((8.9687114132, 22.2744822868), (4.8463766175, 24.9203772716), (0, 24.2083111795))
            Line((0, 24.2083111795), (0, 22.6059219694))
        make_face()
        with BuildLine():
            Line((3.374109886, 18.0922987958), (10.240719772, 16.8117154624))
            ThreePointArc((10.240719772, 16.8117154624), (10.3294493836, 17.4492766553), (10.359109886, 18.0922987958))
            ThreePointArc((10.359109886, 18.0922987958), (10.0024021497, 20.2959245958), (8.9687114132, 22.2744822868))
            Line((8.9687114132, 22.2744822868), (3.374109886, 18.0922987958))
        make_face()
        with BuildLine():
            ThreePointArc((2.1556683682, 11.2143903006), (7.3500328883, 12.3492803142), (10.240719772, 16.8117154624))
            Line((10.240719772, 16.8117154624), (3.374109886, 18.0922987958))
            Line((3.374109886, 18.0922987958), (0, 15.5700196677))
            Line((0, 15.5700196677), (0, 14.8690522954))
            Line((0, 14.8690522954), (2.1556683682, 11.2143903006))
        make_face()
        Polygon((0, 18.7215509241), (3.374109886, 18.0922987958), (0, 22.6059219694), align=None)
        Polygon((0, 15.5700196677), (3.374109886, 18.0922987958), (0, 18.7215509241), align=None)
        Polygon((0, 15.5700196677), (0, 18.7215509241), (-2.5532194688, 19.197711701), (-0.286939248, 15.3555213553), align=None)
        with BuildLine():
            Line((-2.5532194688, 19.197711701), (0, 18.7215509241))
            Line((0, 18.7215509241), (0, 22.6059219694))
            Line((0, 22.6059219694), (-0.808073605, 23.6869003229))
            ThreePointArc((-0.808073605, 23.6869003229), (-2.2730415666, 22.2032482569), (-3.2348314891, 20.3532983314))
            Line((-3.2348314891, 20.3532983314), (-2.5532194688, 19.197711701))
        make_face()
        with BuildLine():
            Line((0, 22.6059219694), (0, 24.2083111795))
            ThreePointArc((0, 24.2083111795), (-0.4130209171, 23.961529178), (-0.808073605, 23.6869003229))
            Line((-0.808073605, 23.6869003229), (0, 22.6059219694))
        make_face()
        Polygon((0, 14.8690522954), (0, 15.5700196677), (-0.286939248, 15.3555213553), align=None)
        with BuildLine():
            ThreePointArc((-3.4925, 19.3728821291), (-3.4288970091, 16.508214775), (-2.2204916412, 13.9101153048))
            Line((-2.2204916412, 13.9101153048), (-0.286939248, 15.3555213553))
            Line((-0.286939248, 15.3555213553), (-2.5532194688, 19.197711701))
            Line((-2.5532194688, 19.197711701), (-3.4925, 19.3728821291))
        make_face()
        with BuildLine():
            ThreePointArc((-2.2204916412, 13.9101153048), (-1.2133043802, 12.8248653268), (0, 11.9762864121))
            Line((0, 11.9762864121), (0, 14.8690522954))
            Line((0, 14.8690522954), (-0.286939248, 15.3555213553))
            Line((-0.286939248, 15.3555213553), (-2.2204916412, 13.9101153048))
        make_face()
        with BuildLine():
            ThreePointArc((0, 11.9762864121), (1.0464493608, 11.5065398054), (2.1556683682, 11.2143903006))
            Line((2.1556683682, 11.2143903006), (0, 14.8690522954))
            Line((0, 14.8690522954), (0, 11.9762864121))
        make_face()
        with BuildLine():
            Line((-3.4925, 19.3728821291), (-2.5532194688, 19.197711701))
            Line((-2.5532194688, 19.197711701), (-3.2348314891, 20.3532983314))
            ThreePointArc((-3.2348314891, 20.3532983314), (-3.3814747986, 19.8677707245), (-3.4925, 19.3728821291))
        make_face()
    extrude(amount=F5_DEPTH)


solid = Compound([f1.part, f3.part, f5.part])
